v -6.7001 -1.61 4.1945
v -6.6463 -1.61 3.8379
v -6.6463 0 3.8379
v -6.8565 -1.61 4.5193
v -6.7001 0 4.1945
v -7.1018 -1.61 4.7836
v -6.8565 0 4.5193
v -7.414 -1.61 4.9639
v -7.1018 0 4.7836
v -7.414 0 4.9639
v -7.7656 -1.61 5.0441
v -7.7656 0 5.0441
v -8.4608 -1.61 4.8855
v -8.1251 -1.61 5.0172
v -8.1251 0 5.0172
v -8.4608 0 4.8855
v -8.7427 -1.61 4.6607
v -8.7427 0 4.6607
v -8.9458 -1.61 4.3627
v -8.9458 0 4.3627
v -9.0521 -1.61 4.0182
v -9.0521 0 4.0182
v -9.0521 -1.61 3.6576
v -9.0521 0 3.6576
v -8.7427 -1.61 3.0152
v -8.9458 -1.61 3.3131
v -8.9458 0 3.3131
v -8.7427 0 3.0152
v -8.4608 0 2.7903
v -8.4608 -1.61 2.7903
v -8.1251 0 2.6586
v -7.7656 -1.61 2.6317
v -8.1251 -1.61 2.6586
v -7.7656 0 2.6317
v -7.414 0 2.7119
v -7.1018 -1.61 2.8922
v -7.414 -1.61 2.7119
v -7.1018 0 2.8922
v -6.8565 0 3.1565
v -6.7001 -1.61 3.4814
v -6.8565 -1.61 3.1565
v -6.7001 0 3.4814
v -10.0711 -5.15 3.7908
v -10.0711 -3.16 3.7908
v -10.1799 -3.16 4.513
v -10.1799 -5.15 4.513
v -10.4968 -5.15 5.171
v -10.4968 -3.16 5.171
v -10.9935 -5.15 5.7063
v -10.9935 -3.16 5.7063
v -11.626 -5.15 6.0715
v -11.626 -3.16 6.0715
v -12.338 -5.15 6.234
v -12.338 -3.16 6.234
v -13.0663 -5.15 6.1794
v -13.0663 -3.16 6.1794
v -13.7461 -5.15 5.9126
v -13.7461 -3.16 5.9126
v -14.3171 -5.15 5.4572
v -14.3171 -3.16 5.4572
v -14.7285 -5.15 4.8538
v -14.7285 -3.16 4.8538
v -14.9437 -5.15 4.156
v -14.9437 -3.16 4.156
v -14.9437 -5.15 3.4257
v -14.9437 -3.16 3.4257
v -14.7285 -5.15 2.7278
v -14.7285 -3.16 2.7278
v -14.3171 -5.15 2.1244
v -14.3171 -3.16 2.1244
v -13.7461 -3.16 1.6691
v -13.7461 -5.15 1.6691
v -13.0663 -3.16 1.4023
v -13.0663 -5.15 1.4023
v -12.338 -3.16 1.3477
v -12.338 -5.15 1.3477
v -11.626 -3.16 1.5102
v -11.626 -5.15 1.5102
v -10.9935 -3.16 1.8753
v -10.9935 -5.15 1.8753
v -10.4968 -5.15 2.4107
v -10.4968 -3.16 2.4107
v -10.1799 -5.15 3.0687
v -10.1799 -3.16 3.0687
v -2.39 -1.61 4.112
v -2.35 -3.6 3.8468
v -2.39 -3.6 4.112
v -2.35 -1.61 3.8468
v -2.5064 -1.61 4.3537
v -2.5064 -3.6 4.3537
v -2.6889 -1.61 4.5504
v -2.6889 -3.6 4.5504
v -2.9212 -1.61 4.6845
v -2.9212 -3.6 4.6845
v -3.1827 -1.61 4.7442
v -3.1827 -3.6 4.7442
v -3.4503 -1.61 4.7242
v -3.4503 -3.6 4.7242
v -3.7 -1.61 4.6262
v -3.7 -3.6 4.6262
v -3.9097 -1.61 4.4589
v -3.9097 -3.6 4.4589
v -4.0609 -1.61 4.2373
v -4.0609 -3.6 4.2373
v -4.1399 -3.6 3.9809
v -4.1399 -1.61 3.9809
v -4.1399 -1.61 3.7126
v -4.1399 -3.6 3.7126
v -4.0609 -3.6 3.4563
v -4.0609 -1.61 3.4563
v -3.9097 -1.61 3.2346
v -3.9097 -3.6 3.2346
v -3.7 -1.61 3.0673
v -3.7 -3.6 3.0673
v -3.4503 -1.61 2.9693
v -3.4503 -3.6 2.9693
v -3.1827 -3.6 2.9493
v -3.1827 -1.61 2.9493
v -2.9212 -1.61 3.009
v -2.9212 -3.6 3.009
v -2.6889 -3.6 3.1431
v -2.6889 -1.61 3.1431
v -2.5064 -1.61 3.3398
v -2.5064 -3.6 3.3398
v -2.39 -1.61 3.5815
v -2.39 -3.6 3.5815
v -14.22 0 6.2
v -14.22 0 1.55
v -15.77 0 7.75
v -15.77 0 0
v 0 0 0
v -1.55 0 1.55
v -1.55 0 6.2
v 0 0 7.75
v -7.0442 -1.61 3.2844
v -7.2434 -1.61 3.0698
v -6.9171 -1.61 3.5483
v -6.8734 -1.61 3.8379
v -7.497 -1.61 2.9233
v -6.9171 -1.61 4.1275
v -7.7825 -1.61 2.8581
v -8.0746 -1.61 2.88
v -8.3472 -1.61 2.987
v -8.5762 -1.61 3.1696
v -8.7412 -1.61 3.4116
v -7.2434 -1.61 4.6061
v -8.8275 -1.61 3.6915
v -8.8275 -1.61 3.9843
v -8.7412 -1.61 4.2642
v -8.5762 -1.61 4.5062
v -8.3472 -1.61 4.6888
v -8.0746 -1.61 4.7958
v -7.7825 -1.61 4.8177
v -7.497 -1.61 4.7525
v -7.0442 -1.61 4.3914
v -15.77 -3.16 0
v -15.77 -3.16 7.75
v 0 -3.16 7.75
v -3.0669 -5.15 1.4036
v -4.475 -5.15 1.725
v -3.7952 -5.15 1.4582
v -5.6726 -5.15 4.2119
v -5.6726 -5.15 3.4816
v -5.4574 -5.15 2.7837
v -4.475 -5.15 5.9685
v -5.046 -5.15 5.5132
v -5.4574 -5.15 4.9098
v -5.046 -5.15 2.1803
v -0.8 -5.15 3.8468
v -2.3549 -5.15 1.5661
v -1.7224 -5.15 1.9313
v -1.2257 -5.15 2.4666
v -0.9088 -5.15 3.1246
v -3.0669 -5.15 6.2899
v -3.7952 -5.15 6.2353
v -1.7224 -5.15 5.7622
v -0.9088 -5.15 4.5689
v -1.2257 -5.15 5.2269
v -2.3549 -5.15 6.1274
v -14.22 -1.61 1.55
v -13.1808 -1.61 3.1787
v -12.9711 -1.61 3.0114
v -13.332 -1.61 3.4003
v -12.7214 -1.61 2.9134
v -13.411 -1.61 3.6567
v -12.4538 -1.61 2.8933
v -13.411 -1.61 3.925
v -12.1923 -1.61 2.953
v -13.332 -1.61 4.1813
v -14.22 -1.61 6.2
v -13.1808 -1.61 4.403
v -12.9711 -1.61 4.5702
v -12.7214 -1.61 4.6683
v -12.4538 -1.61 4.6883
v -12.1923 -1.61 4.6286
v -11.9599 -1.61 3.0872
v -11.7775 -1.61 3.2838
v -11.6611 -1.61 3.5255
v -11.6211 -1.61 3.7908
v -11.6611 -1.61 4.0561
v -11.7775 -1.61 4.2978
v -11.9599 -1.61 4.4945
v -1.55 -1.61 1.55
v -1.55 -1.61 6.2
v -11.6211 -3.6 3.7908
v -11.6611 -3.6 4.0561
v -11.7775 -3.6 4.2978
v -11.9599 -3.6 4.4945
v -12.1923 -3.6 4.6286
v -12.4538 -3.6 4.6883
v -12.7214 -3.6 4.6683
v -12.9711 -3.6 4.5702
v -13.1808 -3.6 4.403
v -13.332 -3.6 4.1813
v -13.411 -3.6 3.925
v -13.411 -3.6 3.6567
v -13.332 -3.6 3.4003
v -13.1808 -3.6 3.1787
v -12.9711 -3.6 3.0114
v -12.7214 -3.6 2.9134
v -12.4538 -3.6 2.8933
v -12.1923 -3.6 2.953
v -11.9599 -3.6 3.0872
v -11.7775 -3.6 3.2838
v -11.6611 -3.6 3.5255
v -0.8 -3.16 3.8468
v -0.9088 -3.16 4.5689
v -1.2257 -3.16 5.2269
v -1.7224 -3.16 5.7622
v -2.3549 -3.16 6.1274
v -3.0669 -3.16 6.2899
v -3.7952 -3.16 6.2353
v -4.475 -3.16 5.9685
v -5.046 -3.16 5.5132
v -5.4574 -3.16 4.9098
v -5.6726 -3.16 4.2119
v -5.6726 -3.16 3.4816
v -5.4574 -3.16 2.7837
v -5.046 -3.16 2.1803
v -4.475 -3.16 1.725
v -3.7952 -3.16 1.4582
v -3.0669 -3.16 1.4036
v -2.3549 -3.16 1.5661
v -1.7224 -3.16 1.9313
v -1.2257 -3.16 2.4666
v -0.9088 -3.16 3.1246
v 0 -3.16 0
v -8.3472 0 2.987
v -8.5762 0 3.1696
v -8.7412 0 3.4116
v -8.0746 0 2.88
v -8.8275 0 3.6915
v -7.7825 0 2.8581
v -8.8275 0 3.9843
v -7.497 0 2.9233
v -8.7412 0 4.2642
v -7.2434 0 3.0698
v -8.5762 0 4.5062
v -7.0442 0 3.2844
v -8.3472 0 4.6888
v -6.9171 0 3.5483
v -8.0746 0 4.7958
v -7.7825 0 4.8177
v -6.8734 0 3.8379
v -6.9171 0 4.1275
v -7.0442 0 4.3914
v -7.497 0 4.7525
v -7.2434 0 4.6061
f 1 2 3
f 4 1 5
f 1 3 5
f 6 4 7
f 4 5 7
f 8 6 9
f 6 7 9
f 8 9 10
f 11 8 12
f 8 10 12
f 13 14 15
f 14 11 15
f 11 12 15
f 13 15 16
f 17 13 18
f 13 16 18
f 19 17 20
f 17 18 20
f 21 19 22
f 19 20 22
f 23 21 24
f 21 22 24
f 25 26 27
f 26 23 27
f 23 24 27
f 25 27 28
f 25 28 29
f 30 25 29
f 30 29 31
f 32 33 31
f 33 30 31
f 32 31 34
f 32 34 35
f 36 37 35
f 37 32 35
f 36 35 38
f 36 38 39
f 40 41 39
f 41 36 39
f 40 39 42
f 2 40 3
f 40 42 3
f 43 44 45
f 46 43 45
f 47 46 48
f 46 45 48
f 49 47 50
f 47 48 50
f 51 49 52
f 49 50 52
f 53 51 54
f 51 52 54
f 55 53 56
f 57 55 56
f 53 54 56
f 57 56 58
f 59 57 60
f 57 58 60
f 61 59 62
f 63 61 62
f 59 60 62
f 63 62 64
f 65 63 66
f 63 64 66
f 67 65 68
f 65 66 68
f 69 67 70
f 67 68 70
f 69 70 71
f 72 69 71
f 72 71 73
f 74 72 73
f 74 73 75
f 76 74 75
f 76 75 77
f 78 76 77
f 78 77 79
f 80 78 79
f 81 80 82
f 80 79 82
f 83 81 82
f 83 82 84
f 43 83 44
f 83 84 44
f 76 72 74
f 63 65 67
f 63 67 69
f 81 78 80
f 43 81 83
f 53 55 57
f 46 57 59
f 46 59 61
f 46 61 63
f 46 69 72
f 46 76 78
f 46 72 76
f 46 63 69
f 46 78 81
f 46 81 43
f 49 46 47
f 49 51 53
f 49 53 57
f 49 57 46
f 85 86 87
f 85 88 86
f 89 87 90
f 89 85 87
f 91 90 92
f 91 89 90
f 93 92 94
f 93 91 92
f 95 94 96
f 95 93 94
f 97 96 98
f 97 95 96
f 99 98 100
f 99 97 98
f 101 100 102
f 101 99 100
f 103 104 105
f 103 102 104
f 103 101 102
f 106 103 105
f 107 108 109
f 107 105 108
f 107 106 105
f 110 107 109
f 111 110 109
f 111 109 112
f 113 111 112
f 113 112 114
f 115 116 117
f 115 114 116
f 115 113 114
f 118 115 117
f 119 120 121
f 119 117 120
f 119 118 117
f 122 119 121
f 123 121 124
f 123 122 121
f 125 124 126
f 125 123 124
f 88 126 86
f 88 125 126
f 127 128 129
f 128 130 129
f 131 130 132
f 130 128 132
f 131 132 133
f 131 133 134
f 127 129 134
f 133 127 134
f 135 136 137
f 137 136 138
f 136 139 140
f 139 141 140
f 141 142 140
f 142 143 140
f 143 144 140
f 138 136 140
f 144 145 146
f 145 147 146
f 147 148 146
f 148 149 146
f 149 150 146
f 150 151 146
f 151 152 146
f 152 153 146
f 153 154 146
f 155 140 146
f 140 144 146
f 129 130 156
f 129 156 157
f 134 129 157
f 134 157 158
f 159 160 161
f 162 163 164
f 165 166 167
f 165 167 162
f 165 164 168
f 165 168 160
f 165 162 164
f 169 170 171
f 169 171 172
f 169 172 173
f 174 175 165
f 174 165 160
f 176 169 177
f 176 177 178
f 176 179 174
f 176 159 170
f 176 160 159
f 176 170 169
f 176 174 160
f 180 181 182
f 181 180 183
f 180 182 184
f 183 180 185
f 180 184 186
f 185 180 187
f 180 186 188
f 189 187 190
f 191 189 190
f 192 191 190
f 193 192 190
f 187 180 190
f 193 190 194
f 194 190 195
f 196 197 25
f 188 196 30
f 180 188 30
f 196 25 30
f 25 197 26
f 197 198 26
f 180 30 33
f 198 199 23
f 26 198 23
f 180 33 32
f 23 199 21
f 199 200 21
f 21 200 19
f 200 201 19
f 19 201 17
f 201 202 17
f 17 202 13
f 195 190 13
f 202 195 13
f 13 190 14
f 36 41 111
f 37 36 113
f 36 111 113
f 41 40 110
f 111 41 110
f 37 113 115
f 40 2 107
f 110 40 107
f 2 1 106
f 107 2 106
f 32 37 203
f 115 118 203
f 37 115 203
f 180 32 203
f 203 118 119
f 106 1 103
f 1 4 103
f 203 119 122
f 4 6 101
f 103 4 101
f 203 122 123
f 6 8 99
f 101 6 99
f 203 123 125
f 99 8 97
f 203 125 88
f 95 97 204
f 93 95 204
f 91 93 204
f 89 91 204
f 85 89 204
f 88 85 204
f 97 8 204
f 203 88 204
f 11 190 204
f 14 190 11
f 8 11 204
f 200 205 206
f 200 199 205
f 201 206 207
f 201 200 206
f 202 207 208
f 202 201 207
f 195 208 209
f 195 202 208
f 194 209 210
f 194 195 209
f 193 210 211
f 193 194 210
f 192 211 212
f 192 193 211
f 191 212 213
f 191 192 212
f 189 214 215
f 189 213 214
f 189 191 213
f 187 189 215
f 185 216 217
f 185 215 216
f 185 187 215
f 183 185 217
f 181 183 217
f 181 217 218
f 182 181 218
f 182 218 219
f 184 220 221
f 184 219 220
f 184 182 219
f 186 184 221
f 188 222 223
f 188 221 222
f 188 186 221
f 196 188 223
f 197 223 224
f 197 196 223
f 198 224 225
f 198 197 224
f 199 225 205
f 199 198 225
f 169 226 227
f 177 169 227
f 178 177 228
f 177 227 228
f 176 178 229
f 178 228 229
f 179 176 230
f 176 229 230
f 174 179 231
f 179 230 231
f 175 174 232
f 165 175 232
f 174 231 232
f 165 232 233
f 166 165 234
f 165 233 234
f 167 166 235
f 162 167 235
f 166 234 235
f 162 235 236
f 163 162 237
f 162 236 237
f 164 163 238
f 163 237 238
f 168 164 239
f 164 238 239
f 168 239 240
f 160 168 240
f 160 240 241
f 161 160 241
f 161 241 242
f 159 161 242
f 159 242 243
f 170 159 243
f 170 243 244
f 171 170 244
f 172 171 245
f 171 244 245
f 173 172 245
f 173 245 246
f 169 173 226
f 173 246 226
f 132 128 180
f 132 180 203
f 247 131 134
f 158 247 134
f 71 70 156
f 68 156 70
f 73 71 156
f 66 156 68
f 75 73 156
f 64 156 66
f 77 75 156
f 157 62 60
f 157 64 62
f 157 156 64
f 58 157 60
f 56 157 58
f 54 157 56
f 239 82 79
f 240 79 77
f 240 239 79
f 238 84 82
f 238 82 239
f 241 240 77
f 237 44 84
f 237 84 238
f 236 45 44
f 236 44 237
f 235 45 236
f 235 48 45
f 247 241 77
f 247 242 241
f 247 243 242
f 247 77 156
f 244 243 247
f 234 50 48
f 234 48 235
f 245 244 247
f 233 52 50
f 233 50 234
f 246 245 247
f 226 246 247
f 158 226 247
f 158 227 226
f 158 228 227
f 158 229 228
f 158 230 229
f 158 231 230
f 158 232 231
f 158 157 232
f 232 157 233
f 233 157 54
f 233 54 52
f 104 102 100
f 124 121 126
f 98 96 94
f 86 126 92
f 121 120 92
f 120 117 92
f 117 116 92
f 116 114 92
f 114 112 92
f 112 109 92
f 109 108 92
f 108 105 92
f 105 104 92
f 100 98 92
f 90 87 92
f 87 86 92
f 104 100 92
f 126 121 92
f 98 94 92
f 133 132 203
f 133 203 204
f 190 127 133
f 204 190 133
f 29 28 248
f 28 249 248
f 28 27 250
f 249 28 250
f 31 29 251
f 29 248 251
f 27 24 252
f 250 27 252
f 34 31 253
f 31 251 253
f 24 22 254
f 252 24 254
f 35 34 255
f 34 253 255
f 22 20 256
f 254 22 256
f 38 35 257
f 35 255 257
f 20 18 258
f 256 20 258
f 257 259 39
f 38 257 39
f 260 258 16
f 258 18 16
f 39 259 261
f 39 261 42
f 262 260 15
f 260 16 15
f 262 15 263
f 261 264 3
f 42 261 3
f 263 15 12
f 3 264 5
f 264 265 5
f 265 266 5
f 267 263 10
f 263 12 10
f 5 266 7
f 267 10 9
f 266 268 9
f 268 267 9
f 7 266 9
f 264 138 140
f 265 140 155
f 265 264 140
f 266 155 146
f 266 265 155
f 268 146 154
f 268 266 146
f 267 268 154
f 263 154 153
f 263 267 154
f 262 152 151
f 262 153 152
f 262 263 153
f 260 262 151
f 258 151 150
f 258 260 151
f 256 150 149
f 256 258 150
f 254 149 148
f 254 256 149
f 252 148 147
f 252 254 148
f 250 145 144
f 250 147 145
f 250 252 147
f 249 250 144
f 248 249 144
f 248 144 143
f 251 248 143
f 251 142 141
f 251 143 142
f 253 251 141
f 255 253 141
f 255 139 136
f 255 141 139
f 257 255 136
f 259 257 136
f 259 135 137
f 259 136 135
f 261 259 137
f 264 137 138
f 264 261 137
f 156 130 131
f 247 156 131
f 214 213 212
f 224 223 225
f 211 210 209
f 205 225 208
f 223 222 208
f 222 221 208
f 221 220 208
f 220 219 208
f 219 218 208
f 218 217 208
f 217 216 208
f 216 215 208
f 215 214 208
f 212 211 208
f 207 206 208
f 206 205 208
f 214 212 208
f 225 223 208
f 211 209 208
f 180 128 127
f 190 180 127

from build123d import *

# Parameters (mm, degrees)
F0_W     = 15.77
F0_H     = 7.75
F1_DEPTH = 3.16
F2_R     = 2.45
F3_DEPTH = 1.99
F4_T     = -1.55
F5_R     = 1.2096188734
F5_R_2   = 0.9825120615
F6_DEPTH = 2


with BuildPart() as f1:
    # F0 (on Front) → F1 (new body)
    with BuildSketch(Plane.XZ):
        with Locations((-7.885, 3.875)):
            Rectangle(F0_W, F0_H)
    extrude(amount=F1_DEPTH)

    # F2 (on face) → F3 (join)
    with BuildSketch(Plane.XZ.offset(3.16)):
        with Locations((-12.5210902126, 3.7908264088)):
            Circle(F2_R)
        with Locations((-3.25, 3.8467605594)):
            Circle(F2_R)
    extrude(amount=F3_DEPTH)

    # F4
    f4_openings = [f1.faces().sort_by_distance(p)[0] for p in [
        (-7.885, 0, 3.875),
    ]]
    offset(amount=F4_T, openings=f4_openings, kind=Kind.INTERSECTION)

    # F5 (on Front) → F6 (join)
    with BuildSketch(Plane.XZ):
        with Locations((-7.8559592366, 3.8379097823)):
            Circle(F5_R)
        with Locations((-7.8559592366, 3.8379097823)):
            Circle(F5_R_2, mode=Mode.SUBTRACT)
    extrude(amount=F6_DEPTH)


solid = f1.part
